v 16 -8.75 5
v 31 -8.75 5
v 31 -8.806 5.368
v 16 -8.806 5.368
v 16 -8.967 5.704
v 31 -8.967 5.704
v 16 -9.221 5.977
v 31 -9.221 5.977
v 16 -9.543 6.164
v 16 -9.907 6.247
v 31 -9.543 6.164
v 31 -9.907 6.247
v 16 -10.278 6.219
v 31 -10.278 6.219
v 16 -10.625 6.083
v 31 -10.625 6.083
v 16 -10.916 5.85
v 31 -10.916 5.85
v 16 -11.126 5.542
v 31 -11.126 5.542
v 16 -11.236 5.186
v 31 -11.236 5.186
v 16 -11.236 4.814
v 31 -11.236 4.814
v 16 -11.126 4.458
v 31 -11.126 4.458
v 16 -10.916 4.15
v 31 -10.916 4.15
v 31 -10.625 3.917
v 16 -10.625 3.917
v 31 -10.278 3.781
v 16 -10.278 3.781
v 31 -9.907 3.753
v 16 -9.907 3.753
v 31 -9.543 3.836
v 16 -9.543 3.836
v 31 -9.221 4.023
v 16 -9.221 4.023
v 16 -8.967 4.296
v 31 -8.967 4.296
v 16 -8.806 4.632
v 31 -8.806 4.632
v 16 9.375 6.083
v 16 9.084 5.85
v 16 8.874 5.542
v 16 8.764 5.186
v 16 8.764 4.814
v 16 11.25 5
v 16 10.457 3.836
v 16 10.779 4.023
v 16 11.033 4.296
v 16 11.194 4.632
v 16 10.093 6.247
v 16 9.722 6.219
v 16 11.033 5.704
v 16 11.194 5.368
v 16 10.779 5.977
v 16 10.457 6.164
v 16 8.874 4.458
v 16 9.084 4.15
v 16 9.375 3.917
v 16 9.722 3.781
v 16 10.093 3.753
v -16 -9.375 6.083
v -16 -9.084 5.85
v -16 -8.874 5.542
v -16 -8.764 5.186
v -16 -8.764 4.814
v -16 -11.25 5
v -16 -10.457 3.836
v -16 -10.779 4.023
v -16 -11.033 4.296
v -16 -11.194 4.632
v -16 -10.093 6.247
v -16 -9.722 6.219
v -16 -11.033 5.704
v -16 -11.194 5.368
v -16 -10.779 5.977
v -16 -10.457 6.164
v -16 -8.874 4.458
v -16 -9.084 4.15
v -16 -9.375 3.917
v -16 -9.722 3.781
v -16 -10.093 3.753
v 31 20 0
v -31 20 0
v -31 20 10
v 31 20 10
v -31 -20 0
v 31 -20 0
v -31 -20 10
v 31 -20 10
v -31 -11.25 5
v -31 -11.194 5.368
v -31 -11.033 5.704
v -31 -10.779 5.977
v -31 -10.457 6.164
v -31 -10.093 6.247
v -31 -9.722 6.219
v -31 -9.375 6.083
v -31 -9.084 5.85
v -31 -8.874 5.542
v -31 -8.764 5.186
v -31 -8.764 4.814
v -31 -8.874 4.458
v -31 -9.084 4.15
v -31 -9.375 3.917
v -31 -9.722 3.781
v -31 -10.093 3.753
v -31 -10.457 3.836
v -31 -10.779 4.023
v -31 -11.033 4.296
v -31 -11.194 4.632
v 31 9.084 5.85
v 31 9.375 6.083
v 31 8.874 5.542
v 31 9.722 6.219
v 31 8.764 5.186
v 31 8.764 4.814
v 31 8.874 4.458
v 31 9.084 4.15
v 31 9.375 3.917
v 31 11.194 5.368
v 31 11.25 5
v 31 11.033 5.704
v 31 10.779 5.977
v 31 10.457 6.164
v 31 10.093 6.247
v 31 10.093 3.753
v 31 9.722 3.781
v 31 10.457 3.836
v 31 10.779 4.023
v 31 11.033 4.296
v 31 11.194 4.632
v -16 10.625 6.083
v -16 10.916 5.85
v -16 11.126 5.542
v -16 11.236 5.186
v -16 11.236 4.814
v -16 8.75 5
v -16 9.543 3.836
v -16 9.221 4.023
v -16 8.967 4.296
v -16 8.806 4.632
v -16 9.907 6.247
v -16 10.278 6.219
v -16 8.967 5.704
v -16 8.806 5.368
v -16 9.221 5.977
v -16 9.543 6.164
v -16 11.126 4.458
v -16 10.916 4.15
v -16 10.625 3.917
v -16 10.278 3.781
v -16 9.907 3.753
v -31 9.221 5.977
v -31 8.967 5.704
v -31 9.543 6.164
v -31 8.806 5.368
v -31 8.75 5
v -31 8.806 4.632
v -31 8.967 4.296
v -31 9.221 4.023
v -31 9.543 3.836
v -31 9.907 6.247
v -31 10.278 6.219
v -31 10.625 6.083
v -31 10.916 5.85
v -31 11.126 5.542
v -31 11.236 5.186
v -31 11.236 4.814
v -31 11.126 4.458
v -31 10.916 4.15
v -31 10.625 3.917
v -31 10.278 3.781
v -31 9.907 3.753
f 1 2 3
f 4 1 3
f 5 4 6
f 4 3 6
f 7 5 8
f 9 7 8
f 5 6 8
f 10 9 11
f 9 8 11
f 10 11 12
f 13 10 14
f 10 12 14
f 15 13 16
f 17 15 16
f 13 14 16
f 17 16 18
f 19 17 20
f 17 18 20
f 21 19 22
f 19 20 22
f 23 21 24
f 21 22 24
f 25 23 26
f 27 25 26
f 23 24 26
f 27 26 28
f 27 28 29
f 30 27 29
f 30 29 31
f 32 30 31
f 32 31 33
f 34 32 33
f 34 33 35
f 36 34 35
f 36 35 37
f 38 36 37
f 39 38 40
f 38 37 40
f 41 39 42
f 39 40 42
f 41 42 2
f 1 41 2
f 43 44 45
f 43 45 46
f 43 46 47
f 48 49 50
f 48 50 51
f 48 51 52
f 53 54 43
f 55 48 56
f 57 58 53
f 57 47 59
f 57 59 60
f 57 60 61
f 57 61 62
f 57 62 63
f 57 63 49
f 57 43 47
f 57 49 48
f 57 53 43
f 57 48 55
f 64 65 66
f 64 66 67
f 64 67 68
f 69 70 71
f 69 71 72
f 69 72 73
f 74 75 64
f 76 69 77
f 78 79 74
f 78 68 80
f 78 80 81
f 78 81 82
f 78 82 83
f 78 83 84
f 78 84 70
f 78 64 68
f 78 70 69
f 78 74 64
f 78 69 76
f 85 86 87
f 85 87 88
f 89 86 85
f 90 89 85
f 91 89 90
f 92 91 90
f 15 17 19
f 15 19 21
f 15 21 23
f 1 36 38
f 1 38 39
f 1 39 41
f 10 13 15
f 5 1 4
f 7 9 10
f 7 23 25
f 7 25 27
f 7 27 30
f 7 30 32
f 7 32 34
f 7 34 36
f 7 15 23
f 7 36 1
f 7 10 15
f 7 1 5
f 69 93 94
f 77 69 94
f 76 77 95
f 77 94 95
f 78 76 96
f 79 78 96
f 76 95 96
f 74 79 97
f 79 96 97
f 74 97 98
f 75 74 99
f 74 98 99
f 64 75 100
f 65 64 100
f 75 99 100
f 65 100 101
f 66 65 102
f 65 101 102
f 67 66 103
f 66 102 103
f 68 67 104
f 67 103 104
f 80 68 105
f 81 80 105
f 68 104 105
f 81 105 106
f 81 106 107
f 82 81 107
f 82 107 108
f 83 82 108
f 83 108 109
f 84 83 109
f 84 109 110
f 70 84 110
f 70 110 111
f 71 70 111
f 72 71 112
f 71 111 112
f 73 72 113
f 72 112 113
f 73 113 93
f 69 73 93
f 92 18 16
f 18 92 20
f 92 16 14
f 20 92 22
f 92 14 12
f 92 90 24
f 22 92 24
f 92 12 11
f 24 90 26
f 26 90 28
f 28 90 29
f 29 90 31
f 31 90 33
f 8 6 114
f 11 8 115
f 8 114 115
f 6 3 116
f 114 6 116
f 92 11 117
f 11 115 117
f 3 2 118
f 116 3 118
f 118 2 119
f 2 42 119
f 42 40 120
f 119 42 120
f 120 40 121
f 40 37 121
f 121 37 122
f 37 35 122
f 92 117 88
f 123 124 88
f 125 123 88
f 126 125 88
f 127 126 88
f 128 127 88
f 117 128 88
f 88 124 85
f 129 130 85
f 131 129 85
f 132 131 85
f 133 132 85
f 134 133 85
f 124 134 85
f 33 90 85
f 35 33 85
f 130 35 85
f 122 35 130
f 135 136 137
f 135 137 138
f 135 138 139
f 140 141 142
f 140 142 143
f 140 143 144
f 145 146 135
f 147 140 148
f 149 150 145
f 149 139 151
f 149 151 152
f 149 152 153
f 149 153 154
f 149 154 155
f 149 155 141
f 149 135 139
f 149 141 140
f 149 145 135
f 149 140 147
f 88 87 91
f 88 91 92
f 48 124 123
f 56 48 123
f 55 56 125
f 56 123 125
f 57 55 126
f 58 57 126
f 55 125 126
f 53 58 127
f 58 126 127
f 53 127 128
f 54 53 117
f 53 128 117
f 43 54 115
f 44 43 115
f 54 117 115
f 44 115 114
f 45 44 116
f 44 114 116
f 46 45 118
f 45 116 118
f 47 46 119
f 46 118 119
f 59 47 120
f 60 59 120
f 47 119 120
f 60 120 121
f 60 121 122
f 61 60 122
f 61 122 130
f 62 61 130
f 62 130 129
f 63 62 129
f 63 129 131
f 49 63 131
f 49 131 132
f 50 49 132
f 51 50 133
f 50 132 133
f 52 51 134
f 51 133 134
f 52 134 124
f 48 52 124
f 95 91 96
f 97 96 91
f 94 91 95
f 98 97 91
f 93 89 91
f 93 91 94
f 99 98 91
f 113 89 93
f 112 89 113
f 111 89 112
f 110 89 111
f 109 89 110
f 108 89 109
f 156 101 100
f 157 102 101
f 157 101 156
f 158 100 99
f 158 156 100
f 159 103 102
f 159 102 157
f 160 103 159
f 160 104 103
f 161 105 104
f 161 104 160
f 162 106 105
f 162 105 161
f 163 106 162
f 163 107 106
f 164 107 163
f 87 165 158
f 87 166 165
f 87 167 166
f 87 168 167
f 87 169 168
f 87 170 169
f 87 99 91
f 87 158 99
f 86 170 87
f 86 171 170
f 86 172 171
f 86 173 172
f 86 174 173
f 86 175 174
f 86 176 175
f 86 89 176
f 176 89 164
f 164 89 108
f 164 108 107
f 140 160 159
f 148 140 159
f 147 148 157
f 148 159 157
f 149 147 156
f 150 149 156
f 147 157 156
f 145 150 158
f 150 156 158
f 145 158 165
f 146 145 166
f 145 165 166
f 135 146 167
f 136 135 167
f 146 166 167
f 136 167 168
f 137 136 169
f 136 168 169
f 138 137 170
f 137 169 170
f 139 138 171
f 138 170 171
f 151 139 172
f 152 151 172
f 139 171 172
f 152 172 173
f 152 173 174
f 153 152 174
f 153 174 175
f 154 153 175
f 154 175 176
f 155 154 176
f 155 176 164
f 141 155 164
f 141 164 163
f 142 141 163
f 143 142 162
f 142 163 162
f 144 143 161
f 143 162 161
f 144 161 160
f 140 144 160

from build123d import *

# Parameters (mm, degrees)
F0_W     = 62
F0_H     = 40
F1_DEPTH = 10
F2_R     = 1.25
F4_DEPTH = 15
F3_R     = 1.25
F5_DEPTH = 15


with BuildPart() as f1:
    # F0 (on Top) → F1 (new body)
    with BuildSketch(Plane.XY):
        Rectangle(F0_W, F0_H)
    extrude(amount=F1_DEPTH)

    # F2 (on face) → F4 (cut)
    with BuildSketch(Plane(origin=(-31, 0, 0), x_dir=(0, -1, 0), z_dir=(-1, 0, 0))):
        with Locations((10, 5)):
            Circle(F2_R)
        with Locations((-10, 5)):
            Circle(F2_R)
    extrude(amount=-F4_DEPTH, mode=Mode.SUBTRACT)

    # F3 (on face) → F5 (cut)
    with BuildSketch(Plane.YZ.offset(31)):
        with Locations((-10, 5)):
            Circle(F3_R)
        with Locations((10, 5)):
            Circle(F3_R)
    extrude(amount=-F5_DEPTH, mode=Mode.SUBTRACT)


solid = f1.part
